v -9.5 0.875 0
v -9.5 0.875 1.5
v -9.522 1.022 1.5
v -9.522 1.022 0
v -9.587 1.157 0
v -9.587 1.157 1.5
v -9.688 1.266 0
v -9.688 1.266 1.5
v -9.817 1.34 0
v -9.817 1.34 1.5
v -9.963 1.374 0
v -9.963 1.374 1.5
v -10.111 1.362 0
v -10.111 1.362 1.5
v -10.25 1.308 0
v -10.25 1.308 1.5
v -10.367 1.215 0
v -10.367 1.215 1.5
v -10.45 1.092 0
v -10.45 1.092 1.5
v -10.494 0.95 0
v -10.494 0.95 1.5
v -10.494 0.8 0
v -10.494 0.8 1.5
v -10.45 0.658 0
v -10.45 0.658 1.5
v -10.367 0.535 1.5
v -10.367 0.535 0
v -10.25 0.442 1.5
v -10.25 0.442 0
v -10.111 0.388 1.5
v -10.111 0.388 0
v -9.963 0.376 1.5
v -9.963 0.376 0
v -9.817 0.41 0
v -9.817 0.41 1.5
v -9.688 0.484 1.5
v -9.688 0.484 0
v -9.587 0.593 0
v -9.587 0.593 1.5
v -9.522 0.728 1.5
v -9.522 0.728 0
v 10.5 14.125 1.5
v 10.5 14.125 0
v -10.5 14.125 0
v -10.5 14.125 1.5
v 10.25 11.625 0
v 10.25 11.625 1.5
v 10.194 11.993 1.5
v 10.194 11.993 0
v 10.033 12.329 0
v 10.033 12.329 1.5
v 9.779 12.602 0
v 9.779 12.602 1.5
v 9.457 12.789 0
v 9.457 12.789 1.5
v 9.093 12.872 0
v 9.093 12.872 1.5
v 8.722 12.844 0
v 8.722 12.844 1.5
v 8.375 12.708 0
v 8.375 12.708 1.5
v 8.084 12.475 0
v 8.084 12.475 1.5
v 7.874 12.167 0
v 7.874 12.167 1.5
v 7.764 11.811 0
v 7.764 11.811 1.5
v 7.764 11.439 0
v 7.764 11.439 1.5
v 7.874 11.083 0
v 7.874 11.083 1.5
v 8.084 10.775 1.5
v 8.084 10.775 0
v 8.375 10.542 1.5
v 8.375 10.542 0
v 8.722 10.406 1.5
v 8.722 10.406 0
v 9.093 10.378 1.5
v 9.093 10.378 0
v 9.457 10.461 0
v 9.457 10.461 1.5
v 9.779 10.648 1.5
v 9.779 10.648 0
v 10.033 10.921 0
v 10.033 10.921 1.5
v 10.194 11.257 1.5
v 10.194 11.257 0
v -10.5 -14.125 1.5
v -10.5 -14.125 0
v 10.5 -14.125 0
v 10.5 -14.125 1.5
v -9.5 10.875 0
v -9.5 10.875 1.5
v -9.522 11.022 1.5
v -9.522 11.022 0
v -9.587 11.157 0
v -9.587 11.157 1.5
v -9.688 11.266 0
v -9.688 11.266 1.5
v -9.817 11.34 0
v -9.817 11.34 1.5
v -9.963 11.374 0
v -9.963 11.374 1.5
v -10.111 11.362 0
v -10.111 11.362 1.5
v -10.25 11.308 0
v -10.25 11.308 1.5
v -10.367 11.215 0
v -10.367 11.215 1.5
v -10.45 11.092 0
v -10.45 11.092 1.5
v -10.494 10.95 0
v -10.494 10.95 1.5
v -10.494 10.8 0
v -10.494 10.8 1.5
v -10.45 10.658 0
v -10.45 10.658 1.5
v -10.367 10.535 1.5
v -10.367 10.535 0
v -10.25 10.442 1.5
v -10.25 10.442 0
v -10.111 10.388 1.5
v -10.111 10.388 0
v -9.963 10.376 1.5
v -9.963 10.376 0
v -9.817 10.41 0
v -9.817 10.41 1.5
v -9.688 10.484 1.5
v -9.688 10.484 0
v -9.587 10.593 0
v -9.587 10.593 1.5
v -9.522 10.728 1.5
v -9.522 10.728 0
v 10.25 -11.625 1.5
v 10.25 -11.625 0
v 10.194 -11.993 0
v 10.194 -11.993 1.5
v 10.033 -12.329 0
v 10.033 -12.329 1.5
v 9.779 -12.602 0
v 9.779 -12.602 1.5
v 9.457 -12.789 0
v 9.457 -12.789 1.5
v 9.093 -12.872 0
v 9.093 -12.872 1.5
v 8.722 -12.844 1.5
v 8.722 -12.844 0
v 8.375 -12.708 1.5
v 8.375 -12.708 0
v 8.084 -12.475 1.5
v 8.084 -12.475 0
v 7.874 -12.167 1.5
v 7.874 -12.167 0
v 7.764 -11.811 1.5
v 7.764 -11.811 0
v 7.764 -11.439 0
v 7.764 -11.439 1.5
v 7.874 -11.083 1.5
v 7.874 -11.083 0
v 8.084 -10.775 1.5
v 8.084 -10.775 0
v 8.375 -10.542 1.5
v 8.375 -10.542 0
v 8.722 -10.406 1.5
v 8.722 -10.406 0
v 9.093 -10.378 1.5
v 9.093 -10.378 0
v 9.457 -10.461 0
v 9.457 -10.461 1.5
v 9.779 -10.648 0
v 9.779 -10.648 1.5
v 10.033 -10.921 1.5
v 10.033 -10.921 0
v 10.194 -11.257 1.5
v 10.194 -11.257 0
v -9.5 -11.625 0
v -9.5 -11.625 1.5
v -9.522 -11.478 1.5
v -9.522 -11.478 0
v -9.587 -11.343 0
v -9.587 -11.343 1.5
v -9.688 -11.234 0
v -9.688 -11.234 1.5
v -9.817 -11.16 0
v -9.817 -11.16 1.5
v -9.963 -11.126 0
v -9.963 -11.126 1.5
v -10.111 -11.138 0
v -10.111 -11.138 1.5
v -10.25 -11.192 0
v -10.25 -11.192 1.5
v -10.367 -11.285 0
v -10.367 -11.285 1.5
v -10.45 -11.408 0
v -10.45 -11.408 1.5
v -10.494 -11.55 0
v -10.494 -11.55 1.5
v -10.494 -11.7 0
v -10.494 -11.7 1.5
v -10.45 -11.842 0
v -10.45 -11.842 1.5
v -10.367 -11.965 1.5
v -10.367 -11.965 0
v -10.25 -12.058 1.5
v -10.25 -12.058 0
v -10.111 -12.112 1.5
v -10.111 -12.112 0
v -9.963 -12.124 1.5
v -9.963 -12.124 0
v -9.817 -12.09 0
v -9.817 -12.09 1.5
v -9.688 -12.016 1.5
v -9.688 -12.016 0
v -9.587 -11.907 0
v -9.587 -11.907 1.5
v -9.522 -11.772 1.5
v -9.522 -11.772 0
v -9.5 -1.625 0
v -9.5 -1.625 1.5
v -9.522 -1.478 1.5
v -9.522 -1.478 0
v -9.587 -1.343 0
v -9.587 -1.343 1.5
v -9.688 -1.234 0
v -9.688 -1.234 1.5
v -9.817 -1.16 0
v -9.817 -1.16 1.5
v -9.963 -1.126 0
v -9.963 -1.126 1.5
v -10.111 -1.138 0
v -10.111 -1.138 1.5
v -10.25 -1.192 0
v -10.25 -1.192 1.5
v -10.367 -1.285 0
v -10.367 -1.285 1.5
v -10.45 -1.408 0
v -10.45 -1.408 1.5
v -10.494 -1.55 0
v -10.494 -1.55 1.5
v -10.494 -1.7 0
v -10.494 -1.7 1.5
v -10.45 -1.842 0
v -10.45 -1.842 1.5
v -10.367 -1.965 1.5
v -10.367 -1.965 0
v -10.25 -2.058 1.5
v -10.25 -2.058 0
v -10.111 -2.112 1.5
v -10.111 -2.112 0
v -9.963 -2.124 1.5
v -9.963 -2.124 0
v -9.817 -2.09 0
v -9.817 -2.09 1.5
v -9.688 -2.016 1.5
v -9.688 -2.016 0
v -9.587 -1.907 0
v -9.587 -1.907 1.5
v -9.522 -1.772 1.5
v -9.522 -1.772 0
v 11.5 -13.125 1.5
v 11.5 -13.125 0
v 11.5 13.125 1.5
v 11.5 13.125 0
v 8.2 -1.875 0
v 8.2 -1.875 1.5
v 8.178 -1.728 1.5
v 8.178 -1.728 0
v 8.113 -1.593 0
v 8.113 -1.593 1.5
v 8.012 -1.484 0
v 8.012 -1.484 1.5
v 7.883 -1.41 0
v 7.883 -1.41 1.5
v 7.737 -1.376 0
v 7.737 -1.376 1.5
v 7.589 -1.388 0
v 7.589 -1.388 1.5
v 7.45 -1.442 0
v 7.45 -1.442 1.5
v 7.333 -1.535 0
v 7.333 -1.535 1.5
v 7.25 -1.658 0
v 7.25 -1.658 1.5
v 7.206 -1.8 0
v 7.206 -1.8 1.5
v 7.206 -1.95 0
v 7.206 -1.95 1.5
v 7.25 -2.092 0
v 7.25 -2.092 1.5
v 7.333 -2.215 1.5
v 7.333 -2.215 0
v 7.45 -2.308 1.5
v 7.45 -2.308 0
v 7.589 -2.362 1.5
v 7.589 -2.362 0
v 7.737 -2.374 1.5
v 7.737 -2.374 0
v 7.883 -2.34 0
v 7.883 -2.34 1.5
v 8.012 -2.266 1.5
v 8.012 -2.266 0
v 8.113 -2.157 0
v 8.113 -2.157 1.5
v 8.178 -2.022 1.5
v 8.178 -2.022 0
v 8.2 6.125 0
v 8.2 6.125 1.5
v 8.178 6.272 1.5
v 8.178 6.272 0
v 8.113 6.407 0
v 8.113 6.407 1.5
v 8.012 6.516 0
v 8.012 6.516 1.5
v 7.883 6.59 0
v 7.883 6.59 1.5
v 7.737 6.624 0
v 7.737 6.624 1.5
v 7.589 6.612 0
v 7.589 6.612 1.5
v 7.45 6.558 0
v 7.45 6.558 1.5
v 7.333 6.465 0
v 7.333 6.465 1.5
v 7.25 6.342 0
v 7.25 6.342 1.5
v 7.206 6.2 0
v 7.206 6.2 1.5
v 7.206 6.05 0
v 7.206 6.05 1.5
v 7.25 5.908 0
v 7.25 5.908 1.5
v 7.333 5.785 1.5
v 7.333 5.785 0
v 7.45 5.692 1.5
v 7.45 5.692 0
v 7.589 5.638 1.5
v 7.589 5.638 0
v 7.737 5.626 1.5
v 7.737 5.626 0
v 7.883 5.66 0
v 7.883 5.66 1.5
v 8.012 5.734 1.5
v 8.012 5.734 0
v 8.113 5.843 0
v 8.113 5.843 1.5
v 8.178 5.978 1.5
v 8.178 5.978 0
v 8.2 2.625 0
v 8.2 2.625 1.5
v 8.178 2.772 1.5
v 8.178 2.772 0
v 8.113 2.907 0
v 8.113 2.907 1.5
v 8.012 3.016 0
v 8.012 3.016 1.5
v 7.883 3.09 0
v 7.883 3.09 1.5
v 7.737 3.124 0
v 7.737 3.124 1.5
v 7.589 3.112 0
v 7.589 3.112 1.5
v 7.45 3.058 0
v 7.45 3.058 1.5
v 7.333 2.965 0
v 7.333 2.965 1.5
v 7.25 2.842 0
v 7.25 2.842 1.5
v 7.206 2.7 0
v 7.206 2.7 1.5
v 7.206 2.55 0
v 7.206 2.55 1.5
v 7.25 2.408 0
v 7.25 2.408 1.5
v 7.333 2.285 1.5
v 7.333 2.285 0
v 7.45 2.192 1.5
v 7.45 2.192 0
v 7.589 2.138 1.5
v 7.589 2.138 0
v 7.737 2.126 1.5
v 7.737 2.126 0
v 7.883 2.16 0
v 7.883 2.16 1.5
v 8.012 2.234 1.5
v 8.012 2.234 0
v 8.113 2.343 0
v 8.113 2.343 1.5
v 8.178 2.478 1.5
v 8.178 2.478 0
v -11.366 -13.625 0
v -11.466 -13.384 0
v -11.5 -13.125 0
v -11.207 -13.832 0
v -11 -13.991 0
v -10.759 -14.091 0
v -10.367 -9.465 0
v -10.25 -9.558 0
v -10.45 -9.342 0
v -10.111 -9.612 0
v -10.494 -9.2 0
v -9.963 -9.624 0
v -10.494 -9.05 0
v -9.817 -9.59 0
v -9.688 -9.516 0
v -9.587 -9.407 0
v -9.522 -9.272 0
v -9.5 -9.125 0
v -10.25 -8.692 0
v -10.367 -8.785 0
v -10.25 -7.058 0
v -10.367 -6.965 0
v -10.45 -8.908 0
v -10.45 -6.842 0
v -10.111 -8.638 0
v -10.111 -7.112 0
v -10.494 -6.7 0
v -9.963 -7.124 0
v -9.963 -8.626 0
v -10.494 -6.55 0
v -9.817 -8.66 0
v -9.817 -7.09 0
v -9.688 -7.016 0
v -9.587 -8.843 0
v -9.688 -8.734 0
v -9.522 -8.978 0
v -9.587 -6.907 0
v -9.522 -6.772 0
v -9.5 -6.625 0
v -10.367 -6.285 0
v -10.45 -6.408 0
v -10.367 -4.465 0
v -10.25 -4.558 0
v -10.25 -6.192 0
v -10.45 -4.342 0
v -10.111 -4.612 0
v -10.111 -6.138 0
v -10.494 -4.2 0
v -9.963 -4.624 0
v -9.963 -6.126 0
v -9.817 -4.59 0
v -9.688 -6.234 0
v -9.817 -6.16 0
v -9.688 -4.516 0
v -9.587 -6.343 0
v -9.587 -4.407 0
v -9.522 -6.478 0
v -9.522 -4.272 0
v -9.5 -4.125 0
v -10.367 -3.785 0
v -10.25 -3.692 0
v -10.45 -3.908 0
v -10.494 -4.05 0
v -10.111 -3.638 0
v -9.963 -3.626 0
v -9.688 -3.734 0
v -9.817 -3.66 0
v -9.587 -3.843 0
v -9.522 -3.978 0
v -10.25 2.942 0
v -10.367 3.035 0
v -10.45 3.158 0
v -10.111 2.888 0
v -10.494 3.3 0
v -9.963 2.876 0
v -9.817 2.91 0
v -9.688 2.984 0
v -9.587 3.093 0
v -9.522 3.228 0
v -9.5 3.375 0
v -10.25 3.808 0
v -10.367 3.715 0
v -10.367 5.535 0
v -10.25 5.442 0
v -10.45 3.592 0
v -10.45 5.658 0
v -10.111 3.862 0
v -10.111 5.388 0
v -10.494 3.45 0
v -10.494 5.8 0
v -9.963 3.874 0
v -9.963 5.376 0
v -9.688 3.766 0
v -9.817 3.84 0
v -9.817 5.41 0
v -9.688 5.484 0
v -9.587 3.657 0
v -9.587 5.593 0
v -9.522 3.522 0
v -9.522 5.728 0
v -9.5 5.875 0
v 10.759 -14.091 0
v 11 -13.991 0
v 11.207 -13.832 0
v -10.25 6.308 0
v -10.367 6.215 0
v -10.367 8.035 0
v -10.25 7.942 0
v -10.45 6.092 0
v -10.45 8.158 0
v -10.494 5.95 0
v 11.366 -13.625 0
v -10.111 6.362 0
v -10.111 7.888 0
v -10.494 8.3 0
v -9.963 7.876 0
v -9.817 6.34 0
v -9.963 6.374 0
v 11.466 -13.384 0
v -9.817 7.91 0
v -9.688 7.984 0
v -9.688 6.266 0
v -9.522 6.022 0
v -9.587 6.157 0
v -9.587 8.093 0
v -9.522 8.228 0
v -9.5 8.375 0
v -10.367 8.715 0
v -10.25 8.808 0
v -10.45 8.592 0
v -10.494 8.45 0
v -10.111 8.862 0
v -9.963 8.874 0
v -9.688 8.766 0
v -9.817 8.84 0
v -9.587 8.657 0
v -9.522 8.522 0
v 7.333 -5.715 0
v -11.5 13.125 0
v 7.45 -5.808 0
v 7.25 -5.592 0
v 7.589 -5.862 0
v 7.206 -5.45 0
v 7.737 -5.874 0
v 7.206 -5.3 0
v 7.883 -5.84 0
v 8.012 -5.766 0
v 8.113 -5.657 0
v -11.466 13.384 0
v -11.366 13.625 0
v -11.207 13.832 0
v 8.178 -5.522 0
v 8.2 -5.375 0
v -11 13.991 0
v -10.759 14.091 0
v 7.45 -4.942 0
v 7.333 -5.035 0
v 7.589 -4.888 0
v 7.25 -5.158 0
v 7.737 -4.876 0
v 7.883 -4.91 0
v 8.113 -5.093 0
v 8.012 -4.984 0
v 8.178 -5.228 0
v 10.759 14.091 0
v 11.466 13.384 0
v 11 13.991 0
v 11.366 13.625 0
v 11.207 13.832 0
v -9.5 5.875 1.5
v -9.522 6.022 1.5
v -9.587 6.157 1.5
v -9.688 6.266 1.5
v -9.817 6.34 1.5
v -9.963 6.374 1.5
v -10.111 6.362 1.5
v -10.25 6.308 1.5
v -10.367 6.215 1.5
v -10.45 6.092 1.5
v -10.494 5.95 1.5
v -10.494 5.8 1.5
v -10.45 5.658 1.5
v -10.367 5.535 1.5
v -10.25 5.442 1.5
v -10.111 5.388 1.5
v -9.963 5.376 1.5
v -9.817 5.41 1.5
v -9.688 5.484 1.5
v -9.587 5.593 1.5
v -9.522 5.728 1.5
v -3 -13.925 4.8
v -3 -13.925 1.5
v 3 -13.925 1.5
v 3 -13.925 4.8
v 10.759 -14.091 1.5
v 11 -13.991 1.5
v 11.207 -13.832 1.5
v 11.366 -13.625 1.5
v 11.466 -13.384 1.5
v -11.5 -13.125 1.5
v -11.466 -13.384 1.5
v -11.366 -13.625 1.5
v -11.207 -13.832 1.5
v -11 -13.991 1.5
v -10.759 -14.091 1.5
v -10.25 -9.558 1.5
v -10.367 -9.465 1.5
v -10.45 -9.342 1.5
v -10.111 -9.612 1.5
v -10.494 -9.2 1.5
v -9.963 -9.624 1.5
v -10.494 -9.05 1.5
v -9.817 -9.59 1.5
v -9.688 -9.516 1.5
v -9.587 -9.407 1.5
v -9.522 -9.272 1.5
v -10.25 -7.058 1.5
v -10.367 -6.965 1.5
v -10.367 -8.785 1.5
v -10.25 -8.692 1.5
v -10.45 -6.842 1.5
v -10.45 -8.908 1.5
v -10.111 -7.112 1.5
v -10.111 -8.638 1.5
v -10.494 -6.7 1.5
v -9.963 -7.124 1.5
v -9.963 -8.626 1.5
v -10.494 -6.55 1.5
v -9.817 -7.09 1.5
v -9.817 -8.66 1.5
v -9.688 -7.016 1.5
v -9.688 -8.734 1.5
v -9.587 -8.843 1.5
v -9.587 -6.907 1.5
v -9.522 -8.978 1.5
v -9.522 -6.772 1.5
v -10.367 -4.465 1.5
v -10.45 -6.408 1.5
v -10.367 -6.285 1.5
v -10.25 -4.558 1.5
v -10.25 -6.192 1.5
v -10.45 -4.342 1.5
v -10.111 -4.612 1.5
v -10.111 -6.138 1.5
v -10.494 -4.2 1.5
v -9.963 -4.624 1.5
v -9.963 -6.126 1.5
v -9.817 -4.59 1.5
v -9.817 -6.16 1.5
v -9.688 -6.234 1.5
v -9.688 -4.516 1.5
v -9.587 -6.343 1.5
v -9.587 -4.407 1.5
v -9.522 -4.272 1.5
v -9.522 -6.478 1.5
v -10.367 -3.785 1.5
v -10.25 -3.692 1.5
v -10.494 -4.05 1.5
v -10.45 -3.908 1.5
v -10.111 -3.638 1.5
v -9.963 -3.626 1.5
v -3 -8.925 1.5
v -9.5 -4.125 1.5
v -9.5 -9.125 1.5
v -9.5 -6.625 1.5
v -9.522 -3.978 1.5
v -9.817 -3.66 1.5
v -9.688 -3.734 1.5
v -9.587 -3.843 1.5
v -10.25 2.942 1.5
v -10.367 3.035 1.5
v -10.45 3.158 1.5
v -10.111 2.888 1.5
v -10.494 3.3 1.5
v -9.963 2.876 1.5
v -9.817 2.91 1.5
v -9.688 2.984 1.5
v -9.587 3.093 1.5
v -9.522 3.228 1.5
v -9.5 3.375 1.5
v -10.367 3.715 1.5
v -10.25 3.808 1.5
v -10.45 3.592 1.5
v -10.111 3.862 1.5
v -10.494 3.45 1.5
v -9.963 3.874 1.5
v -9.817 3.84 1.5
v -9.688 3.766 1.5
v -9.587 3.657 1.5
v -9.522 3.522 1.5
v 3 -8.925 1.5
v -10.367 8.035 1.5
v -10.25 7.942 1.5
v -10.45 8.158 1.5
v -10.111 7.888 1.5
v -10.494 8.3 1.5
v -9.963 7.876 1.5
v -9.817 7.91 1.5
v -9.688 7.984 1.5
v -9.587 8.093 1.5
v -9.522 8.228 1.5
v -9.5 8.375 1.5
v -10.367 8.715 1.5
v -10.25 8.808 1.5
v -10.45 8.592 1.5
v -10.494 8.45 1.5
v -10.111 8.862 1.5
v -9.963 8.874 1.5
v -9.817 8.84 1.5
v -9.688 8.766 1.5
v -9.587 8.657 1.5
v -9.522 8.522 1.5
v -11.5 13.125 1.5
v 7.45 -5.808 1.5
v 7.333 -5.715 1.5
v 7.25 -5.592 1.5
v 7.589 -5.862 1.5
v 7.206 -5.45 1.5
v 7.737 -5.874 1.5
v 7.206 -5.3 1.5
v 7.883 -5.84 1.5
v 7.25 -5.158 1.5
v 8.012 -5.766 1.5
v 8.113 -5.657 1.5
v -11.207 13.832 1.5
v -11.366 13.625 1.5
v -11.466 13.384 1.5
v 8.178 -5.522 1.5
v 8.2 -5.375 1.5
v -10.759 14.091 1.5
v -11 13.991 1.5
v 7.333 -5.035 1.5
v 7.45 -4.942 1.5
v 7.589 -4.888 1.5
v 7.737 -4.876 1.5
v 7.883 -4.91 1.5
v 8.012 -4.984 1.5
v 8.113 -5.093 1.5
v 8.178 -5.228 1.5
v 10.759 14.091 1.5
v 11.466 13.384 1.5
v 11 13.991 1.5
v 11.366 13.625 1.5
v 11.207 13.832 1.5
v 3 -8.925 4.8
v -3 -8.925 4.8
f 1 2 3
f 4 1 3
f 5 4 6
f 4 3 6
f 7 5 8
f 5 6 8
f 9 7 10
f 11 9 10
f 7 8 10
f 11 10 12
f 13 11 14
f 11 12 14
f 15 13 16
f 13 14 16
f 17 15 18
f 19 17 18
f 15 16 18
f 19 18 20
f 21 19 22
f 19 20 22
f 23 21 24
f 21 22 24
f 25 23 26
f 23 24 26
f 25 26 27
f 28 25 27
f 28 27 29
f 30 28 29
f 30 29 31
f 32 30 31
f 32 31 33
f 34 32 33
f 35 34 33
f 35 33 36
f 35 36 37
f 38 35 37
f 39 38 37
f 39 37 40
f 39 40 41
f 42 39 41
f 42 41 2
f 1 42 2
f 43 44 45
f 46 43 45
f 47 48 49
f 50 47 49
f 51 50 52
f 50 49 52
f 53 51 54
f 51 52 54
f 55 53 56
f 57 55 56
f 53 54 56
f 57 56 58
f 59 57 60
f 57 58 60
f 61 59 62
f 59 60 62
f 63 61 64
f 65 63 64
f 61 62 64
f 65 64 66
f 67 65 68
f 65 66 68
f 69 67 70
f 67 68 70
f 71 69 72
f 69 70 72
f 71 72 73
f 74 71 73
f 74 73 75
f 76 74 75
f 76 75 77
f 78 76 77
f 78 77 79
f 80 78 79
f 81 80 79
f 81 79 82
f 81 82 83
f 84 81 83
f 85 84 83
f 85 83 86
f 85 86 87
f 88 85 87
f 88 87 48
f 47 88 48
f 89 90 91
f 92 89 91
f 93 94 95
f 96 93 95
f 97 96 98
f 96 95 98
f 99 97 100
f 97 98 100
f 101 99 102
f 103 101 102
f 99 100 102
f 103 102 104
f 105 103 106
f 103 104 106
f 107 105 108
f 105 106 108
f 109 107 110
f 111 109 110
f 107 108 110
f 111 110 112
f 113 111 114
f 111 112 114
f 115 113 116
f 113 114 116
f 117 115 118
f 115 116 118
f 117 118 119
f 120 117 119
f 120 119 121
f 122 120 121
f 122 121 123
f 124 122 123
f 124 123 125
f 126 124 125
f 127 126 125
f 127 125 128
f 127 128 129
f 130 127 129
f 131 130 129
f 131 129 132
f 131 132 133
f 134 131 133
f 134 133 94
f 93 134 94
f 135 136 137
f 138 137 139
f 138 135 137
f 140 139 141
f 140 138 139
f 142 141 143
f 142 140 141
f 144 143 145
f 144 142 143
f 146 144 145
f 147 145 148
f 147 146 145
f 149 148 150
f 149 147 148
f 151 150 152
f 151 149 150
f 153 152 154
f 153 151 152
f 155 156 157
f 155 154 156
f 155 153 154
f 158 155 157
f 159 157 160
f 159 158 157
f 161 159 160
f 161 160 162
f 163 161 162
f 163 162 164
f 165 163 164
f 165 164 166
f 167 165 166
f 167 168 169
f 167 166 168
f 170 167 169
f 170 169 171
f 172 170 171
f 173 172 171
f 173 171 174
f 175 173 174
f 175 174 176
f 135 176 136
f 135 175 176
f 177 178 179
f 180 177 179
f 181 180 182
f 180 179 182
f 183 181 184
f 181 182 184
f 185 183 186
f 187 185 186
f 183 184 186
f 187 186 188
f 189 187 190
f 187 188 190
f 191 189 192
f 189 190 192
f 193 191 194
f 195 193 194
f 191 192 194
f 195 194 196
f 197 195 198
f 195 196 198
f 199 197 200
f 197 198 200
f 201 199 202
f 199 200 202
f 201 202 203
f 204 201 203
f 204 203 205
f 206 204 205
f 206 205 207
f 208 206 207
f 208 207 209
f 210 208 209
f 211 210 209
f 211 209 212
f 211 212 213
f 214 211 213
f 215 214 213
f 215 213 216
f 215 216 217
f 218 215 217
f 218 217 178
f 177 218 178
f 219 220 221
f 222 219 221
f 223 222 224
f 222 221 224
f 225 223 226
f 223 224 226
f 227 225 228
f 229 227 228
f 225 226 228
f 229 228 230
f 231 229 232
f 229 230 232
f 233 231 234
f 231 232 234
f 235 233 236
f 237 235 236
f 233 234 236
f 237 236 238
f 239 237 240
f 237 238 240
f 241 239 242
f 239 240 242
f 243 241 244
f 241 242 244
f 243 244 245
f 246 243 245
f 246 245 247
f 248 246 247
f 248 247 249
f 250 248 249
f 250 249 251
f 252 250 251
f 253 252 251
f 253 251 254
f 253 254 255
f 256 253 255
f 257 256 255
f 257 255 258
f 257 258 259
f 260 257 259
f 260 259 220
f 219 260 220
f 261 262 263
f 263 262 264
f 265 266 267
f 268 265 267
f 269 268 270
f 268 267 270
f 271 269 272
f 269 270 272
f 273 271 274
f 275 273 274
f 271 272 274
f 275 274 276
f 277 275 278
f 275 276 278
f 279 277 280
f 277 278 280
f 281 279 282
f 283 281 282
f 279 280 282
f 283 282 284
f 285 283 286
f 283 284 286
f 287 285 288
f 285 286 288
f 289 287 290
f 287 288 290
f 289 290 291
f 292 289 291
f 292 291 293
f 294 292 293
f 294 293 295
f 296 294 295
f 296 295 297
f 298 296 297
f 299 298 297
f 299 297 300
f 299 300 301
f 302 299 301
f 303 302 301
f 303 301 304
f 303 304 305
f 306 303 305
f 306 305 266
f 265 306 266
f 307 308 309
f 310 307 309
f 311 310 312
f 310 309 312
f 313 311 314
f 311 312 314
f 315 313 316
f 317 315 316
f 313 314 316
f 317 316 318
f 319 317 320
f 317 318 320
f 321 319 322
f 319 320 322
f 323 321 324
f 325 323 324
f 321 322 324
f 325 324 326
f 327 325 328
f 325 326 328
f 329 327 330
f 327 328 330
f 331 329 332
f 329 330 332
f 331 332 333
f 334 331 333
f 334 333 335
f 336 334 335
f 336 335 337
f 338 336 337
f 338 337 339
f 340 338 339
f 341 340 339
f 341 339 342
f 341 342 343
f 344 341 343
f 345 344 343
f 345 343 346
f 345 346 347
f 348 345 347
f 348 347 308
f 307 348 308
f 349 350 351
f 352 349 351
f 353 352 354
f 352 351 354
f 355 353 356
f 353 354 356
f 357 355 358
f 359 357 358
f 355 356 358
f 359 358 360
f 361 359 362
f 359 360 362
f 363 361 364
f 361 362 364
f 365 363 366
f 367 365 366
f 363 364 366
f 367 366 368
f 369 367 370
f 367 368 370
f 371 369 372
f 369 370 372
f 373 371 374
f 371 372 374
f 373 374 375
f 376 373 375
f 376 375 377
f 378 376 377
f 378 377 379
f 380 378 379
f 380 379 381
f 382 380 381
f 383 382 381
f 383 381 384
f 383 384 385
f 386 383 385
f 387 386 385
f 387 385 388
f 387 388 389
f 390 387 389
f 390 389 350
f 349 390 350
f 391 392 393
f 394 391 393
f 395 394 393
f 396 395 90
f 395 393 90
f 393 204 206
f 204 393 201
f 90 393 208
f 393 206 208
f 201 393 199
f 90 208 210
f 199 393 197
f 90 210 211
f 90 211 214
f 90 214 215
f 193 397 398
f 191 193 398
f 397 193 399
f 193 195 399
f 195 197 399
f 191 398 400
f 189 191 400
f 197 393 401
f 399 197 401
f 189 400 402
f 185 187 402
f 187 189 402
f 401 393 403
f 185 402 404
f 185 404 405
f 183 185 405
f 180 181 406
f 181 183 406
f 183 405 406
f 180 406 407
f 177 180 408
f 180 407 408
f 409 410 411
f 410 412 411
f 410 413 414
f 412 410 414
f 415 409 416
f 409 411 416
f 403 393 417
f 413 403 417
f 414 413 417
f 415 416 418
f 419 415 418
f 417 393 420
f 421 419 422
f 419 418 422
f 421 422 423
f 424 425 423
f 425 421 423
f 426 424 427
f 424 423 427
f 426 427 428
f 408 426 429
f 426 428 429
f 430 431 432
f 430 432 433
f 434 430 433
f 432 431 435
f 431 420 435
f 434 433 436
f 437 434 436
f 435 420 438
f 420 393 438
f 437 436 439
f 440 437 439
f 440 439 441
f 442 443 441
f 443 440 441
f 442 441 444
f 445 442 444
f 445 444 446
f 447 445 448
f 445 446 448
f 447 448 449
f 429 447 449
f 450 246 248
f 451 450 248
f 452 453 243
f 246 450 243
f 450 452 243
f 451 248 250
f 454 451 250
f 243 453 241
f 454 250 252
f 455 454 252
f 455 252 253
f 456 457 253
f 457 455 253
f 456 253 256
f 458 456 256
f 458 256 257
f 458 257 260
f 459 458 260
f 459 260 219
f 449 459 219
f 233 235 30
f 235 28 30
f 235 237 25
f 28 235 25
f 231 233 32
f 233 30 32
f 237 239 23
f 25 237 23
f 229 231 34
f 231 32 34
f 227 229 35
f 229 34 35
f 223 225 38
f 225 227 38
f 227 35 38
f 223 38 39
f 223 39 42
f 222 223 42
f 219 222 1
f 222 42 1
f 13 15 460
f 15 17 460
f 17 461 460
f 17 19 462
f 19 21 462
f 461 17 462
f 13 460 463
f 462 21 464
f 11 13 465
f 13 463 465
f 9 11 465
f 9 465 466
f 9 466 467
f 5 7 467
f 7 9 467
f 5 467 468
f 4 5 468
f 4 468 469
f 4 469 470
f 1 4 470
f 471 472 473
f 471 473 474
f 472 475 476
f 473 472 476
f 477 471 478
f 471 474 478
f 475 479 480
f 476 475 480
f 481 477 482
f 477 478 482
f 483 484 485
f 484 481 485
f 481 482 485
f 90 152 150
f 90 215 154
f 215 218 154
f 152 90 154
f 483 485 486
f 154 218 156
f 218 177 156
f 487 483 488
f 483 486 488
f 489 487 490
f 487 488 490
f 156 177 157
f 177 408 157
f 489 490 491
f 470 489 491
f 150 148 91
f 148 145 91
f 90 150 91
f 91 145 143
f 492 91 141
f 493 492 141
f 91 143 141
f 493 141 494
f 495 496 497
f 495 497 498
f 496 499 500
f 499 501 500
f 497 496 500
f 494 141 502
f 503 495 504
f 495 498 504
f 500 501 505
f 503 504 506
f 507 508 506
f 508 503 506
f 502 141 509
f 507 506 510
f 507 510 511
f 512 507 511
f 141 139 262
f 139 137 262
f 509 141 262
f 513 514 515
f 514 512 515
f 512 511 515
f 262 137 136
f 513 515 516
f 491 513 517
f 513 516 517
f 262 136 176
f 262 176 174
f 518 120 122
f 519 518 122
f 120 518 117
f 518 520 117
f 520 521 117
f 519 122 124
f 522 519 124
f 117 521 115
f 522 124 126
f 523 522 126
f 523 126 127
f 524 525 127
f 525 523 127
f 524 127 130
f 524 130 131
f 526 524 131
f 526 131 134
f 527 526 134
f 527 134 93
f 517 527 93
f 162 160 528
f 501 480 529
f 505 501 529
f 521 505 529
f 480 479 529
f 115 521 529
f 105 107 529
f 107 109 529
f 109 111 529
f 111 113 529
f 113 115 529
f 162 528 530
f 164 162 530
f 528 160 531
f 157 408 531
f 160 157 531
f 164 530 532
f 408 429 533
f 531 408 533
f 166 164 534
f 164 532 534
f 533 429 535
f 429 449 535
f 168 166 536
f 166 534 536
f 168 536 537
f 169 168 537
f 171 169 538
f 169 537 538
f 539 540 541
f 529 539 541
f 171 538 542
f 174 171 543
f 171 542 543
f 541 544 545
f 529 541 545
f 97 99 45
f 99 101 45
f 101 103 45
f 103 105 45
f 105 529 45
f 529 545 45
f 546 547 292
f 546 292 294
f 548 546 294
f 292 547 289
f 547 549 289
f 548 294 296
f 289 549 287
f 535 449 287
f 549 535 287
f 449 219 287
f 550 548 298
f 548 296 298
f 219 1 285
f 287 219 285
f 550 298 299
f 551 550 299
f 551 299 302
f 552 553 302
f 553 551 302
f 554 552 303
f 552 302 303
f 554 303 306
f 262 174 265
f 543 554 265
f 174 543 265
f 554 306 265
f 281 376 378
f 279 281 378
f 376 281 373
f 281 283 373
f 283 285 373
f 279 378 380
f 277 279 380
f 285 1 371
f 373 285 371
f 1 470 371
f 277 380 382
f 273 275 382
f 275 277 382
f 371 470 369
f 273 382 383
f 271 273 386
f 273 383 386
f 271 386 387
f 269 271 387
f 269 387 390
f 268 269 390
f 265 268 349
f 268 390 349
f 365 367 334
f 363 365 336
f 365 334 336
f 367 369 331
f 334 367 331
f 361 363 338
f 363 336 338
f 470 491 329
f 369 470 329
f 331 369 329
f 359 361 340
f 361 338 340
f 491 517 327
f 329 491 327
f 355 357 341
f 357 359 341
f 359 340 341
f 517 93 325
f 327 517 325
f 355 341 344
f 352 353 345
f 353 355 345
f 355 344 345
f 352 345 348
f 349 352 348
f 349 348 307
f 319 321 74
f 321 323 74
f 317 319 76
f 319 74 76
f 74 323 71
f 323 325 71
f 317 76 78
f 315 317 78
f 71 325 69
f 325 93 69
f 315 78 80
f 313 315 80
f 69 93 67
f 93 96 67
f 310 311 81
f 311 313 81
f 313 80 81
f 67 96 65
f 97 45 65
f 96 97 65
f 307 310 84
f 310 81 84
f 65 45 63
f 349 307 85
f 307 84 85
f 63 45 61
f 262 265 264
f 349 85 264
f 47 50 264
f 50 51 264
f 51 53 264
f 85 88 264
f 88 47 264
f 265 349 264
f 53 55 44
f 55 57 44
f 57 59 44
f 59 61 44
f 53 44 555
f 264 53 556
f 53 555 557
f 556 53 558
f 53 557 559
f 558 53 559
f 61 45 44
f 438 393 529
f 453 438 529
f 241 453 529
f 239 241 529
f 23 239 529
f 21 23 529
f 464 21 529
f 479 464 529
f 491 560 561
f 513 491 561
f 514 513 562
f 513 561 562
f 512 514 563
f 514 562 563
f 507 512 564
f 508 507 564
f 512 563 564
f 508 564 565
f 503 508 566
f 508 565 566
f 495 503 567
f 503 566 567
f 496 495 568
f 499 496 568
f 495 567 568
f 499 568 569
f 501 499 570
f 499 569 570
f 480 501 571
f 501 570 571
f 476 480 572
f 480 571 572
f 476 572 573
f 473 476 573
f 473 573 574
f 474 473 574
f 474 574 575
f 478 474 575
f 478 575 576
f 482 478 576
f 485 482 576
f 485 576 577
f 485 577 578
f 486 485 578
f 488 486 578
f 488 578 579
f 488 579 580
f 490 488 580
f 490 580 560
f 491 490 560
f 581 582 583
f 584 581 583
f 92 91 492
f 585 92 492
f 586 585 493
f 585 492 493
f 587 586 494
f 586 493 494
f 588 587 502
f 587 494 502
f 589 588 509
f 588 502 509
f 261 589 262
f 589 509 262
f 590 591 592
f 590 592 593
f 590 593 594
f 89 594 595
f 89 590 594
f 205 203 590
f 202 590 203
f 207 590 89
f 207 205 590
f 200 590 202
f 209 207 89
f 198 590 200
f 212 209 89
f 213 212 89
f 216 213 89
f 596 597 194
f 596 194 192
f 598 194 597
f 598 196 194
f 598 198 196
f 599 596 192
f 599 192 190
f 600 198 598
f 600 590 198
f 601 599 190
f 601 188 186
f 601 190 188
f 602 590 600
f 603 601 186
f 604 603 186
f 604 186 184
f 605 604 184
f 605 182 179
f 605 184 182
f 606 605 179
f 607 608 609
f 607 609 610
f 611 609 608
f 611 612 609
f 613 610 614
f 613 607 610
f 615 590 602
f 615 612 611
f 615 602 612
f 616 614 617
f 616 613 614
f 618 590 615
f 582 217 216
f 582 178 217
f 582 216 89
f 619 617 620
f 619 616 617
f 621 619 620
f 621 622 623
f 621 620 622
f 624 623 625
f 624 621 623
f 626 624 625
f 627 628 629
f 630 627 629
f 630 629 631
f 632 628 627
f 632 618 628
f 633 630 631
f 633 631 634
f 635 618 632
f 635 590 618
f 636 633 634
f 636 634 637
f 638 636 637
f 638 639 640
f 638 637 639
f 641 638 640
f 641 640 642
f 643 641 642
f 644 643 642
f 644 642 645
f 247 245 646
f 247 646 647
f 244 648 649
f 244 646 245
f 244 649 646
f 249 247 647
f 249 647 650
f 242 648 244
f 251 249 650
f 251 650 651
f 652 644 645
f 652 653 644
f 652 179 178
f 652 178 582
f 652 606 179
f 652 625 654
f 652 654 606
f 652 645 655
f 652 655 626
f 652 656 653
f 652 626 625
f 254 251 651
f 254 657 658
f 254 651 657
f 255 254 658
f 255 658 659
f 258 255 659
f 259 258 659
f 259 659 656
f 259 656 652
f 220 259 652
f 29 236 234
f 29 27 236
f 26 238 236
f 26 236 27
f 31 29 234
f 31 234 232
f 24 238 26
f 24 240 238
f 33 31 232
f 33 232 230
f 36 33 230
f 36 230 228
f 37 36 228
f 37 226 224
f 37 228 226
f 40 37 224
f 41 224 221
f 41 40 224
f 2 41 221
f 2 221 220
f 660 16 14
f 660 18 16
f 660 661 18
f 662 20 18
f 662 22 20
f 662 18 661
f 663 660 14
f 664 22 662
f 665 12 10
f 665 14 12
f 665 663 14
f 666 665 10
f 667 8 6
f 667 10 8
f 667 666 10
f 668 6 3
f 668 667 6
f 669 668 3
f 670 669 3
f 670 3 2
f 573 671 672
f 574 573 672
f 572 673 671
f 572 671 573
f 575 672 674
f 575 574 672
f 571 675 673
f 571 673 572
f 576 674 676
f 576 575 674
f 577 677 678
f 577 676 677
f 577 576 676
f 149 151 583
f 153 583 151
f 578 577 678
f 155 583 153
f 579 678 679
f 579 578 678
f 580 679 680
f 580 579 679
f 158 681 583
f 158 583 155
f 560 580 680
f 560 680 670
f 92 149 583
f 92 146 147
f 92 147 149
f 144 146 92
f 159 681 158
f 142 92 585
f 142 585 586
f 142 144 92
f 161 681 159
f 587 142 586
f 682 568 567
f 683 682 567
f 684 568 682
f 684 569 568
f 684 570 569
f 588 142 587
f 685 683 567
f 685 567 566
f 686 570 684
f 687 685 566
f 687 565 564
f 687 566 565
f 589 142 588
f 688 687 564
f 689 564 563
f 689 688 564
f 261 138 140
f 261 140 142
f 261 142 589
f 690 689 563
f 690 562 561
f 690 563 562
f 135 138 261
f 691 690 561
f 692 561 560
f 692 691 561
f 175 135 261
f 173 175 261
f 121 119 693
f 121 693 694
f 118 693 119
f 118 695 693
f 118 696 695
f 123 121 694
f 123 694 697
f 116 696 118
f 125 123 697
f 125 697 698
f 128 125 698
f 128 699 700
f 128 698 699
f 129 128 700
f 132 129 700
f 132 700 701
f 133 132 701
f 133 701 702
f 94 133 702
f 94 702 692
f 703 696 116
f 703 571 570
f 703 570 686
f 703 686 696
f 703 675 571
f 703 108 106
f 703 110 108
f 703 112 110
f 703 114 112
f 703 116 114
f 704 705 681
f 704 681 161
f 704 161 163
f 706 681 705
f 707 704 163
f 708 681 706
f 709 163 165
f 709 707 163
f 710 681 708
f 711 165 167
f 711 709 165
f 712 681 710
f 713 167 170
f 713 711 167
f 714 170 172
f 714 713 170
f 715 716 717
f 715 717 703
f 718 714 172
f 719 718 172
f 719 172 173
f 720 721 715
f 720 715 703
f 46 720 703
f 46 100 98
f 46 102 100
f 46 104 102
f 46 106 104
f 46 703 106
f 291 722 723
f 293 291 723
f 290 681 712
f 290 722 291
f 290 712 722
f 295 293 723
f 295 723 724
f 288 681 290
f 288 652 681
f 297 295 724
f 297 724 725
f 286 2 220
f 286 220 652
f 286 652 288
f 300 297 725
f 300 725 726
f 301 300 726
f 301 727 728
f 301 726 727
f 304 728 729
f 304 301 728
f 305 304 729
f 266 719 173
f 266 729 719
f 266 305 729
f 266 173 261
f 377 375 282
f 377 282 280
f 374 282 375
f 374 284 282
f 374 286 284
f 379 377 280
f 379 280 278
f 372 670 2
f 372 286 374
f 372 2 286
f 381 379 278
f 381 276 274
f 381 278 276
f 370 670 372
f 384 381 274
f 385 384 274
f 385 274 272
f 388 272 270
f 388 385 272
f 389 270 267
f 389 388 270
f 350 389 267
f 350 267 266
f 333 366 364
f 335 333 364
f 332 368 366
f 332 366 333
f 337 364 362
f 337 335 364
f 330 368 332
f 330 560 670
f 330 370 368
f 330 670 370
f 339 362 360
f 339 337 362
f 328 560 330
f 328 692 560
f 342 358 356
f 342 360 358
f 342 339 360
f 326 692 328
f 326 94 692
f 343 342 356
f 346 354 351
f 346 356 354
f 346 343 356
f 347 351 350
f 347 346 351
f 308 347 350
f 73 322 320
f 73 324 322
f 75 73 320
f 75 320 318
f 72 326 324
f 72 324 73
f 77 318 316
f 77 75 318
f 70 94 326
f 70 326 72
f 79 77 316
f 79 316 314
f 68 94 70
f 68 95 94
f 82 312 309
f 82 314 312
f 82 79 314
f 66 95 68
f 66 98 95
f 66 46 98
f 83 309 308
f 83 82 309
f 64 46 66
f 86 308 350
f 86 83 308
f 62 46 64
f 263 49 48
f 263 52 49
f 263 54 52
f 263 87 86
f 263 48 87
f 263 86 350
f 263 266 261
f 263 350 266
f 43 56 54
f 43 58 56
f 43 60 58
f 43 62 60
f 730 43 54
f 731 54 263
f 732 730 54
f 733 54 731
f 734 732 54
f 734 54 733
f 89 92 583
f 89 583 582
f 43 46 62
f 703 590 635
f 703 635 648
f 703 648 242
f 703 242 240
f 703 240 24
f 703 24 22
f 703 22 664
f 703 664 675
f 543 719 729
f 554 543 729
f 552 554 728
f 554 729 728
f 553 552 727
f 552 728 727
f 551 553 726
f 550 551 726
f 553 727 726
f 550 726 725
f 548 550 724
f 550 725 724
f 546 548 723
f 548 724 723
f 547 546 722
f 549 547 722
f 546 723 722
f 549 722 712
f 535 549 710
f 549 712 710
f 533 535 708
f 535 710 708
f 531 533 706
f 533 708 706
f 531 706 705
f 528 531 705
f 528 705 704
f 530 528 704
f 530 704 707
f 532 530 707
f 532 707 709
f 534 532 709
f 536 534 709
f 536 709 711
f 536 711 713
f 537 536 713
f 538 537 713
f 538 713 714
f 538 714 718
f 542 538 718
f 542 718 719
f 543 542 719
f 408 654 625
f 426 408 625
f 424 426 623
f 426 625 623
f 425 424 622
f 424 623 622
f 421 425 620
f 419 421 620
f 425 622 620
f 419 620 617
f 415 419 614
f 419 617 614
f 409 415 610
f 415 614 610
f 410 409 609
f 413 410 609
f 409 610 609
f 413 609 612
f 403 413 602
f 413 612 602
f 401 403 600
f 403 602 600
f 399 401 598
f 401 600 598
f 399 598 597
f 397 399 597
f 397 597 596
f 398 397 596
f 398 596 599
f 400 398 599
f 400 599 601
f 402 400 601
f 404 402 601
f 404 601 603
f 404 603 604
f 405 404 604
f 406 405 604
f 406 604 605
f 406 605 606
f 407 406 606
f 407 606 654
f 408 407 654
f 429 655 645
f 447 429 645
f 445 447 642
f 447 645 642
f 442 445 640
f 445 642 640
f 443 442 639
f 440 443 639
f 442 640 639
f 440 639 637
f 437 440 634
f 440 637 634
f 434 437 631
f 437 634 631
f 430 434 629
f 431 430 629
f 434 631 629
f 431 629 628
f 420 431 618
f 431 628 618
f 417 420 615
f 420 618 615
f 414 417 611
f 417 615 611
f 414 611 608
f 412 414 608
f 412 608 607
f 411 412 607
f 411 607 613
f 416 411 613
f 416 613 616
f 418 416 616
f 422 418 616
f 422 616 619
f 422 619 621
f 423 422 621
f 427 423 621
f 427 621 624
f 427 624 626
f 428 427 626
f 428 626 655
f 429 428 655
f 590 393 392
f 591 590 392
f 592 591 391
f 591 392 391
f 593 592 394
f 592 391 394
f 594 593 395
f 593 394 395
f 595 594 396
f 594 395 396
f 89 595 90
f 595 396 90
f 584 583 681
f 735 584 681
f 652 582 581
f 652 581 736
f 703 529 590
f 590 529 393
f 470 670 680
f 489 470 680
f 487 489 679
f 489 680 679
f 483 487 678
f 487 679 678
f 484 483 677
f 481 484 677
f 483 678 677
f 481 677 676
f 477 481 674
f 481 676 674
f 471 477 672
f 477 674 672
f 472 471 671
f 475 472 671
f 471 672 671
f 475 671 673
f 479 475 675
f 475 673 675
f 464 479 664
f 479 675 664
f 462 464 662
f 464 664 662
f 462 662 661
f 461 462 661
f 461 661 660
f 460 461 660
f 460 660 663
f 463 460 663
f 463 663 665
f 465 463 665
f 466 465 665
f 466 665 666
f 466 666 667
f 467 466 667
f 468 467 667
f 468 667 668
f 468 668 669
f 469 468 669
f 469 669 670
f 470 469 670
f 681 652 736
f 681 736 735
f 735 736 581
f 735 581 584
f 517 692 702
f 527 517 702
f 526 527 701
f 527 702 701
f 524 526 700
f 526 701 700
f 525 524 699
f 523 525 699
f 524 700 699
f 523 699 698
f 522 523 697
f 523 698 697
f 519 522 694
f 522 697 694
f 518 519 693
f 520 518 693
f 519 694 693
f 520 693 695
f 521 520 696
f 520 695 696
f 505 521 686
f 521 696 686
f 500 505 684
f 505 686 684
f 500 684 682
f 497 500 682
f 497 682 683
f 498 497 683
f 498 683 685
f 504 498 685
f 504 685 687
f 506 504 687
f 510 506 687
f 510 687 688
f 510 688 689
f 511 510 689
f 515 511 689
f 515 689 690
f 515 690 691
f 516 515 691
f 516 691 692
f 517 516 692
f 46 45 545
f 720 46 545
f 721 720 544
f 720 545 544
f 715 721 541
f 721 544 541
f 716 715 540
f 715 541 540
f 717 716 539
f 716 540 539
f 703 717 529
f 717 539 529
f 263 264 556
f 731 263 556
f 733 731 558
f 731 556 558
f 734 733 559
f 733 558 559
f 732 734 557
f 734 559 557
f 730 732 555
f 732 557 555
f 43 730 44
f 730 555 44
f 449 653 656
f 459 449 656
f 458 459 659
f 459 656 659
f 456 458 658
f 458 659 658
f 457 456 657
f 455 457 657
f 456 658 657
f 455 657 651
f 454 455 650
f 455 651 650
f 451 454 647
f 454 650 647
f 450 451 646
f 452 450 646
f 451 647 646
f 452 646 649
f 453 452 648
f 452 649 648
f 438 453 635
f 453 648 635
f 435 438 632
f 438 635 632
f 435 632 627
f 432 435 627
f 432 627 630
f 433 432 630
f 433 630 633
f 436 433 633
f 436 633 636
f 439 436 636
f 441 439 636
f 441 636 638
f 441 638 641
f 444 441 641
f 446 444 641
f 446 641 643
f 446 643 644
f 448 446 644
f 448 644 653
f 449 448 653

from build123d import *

# Parameters (mm, degrees)
BOSS_EXTRUDE1_DEPTH  = 1.5
SKETCH2_R            = 1.25
CUT_EXTRUDE1_DEPTH   = 19.276094358
SKETCH3_R            = 0.5
CUT_EXTRUDE2_DEPTH   = 19.276094358
LPATTERN1_COUNT      = 10
LPATTERN1_PITCH      = 2.5
SKETCH4_W            = 6
SKETCH4_H            = 5
GAIN_SWITCH_DEPTH    = 3.3
SKETCH5_R            = 0.5
CUT_EXTRUDE3_DEPTH   = 19.510959592
LPATTERN2_COUNT      = 2
LPATTERN2_PITCH      = 3.5
LPATTERN2_COUNT_DIR2 = 2
LPATTERN2_PITCH_DIR2 = 8


with BuildPart() as part:
    # Sketch1 → Boss-Extrude1 (new body)
    with BuildSketch(Plane.XY):
        with BuildLine():
            Line((-10.5, -14.125), (10.5, -14.125))
            ThreePointArc((10.5, -14.125), (11.207106781, -13.832106781), (11.5, -13.125))
            Line((11.5, -13.125), (11.5, 13.125))
            ThreePointArc((11.5, 13.125), (11.207106781, 13.832106781), (10.5, 14.125))
            Line((10.5, 14.125), (-10.5, 14.125))
            ThreePointArc((-10.5, 14.125), (-11.207106781, 13.832106781), (-11.5, 13.125))
            Line((-11.5, 13.125), (-11.5, -13.125))
            ThreePointArc((-11.5, -13.125), (-11.207106781, -13.832106781), (-10.5, -14.125))
        make_face()
    extrude(amount=BOSS_EXTRUDE1_DEPTH)

    # Sketch2 → Cut-Extrude1 (cut, through all)
    with BuildSketch(Plane.XY.offset(1.5)):
        with Locations((9, 11.625)):
            Circle(SKETCH2_R)
    cut_extrude1 = extrude(amount=-CUT_EXTRUDE1_DEPTH, mode=Mode.SUBTRACT)

    # Mirror1: Cut-Extrude1 across plane
    add(cut_extrude1.mirror(Plane.ZX), mode=Mode.SUBTRACT)

    # Sketch3 → Cut-Extrude2 (cut, through all)
    with BuildSketch(Plane.XY.offset(1.5)):
        with Locations((-10, -11.625)):
            Circle(SKETCH3_R)
    cut_extrude2 = extrude(amount=-CUT_EXTRUDE2_DEPTH, mode=Mode.SUBTRACT)

    # LPattern1: Cut-Extrude2 ×10
    with Locations(*[(0, i * LPATTERN1_PITCH, 0) for i in range(1, LPATTERN1_COUNT)]):
        add(cut_extrude2, mode=Mode.SUBTRACT)

    # Sketch4 → Gain Switch (add)
    with BuildSketch(Plane.XY.offset(1.5)):
        with Locations((0, -11.425)):
            Rectangle(SKETCH4_W, SKETCH4_H)
    extrude(amount=GAIN_SWITCH_DEPTH)

    # Sketch5 → Cut-Extrude3 (cut, through all)
    with BuildSketch(Plane.XY.offset(1.5)):
        with Locations((7.7, 6.125)):
            Circle(SKETCH5_R)
    cut_extrude3 = extrude(amount=-CUT_EXTRUDE3_DEPTH, mode=Mode.SUBTRACT)

    # LPattern2: Cut-Extrude3 2 × 2
    with Locations(*[Vector(0, -1, 0) * (i * LPATTERN2_PITCH) + Vector(0, -1, 0) * (j * LPATTERN2_PITCH_DIR2) for i in range(LPATTERN2_COUNT) for j in range(LPATTERN2_COUNT_DIR2) if (i, j) != (0, 0)]):
        add(cut_extrude3, mode=Mode.SUBTRACT)


solid = part.part
